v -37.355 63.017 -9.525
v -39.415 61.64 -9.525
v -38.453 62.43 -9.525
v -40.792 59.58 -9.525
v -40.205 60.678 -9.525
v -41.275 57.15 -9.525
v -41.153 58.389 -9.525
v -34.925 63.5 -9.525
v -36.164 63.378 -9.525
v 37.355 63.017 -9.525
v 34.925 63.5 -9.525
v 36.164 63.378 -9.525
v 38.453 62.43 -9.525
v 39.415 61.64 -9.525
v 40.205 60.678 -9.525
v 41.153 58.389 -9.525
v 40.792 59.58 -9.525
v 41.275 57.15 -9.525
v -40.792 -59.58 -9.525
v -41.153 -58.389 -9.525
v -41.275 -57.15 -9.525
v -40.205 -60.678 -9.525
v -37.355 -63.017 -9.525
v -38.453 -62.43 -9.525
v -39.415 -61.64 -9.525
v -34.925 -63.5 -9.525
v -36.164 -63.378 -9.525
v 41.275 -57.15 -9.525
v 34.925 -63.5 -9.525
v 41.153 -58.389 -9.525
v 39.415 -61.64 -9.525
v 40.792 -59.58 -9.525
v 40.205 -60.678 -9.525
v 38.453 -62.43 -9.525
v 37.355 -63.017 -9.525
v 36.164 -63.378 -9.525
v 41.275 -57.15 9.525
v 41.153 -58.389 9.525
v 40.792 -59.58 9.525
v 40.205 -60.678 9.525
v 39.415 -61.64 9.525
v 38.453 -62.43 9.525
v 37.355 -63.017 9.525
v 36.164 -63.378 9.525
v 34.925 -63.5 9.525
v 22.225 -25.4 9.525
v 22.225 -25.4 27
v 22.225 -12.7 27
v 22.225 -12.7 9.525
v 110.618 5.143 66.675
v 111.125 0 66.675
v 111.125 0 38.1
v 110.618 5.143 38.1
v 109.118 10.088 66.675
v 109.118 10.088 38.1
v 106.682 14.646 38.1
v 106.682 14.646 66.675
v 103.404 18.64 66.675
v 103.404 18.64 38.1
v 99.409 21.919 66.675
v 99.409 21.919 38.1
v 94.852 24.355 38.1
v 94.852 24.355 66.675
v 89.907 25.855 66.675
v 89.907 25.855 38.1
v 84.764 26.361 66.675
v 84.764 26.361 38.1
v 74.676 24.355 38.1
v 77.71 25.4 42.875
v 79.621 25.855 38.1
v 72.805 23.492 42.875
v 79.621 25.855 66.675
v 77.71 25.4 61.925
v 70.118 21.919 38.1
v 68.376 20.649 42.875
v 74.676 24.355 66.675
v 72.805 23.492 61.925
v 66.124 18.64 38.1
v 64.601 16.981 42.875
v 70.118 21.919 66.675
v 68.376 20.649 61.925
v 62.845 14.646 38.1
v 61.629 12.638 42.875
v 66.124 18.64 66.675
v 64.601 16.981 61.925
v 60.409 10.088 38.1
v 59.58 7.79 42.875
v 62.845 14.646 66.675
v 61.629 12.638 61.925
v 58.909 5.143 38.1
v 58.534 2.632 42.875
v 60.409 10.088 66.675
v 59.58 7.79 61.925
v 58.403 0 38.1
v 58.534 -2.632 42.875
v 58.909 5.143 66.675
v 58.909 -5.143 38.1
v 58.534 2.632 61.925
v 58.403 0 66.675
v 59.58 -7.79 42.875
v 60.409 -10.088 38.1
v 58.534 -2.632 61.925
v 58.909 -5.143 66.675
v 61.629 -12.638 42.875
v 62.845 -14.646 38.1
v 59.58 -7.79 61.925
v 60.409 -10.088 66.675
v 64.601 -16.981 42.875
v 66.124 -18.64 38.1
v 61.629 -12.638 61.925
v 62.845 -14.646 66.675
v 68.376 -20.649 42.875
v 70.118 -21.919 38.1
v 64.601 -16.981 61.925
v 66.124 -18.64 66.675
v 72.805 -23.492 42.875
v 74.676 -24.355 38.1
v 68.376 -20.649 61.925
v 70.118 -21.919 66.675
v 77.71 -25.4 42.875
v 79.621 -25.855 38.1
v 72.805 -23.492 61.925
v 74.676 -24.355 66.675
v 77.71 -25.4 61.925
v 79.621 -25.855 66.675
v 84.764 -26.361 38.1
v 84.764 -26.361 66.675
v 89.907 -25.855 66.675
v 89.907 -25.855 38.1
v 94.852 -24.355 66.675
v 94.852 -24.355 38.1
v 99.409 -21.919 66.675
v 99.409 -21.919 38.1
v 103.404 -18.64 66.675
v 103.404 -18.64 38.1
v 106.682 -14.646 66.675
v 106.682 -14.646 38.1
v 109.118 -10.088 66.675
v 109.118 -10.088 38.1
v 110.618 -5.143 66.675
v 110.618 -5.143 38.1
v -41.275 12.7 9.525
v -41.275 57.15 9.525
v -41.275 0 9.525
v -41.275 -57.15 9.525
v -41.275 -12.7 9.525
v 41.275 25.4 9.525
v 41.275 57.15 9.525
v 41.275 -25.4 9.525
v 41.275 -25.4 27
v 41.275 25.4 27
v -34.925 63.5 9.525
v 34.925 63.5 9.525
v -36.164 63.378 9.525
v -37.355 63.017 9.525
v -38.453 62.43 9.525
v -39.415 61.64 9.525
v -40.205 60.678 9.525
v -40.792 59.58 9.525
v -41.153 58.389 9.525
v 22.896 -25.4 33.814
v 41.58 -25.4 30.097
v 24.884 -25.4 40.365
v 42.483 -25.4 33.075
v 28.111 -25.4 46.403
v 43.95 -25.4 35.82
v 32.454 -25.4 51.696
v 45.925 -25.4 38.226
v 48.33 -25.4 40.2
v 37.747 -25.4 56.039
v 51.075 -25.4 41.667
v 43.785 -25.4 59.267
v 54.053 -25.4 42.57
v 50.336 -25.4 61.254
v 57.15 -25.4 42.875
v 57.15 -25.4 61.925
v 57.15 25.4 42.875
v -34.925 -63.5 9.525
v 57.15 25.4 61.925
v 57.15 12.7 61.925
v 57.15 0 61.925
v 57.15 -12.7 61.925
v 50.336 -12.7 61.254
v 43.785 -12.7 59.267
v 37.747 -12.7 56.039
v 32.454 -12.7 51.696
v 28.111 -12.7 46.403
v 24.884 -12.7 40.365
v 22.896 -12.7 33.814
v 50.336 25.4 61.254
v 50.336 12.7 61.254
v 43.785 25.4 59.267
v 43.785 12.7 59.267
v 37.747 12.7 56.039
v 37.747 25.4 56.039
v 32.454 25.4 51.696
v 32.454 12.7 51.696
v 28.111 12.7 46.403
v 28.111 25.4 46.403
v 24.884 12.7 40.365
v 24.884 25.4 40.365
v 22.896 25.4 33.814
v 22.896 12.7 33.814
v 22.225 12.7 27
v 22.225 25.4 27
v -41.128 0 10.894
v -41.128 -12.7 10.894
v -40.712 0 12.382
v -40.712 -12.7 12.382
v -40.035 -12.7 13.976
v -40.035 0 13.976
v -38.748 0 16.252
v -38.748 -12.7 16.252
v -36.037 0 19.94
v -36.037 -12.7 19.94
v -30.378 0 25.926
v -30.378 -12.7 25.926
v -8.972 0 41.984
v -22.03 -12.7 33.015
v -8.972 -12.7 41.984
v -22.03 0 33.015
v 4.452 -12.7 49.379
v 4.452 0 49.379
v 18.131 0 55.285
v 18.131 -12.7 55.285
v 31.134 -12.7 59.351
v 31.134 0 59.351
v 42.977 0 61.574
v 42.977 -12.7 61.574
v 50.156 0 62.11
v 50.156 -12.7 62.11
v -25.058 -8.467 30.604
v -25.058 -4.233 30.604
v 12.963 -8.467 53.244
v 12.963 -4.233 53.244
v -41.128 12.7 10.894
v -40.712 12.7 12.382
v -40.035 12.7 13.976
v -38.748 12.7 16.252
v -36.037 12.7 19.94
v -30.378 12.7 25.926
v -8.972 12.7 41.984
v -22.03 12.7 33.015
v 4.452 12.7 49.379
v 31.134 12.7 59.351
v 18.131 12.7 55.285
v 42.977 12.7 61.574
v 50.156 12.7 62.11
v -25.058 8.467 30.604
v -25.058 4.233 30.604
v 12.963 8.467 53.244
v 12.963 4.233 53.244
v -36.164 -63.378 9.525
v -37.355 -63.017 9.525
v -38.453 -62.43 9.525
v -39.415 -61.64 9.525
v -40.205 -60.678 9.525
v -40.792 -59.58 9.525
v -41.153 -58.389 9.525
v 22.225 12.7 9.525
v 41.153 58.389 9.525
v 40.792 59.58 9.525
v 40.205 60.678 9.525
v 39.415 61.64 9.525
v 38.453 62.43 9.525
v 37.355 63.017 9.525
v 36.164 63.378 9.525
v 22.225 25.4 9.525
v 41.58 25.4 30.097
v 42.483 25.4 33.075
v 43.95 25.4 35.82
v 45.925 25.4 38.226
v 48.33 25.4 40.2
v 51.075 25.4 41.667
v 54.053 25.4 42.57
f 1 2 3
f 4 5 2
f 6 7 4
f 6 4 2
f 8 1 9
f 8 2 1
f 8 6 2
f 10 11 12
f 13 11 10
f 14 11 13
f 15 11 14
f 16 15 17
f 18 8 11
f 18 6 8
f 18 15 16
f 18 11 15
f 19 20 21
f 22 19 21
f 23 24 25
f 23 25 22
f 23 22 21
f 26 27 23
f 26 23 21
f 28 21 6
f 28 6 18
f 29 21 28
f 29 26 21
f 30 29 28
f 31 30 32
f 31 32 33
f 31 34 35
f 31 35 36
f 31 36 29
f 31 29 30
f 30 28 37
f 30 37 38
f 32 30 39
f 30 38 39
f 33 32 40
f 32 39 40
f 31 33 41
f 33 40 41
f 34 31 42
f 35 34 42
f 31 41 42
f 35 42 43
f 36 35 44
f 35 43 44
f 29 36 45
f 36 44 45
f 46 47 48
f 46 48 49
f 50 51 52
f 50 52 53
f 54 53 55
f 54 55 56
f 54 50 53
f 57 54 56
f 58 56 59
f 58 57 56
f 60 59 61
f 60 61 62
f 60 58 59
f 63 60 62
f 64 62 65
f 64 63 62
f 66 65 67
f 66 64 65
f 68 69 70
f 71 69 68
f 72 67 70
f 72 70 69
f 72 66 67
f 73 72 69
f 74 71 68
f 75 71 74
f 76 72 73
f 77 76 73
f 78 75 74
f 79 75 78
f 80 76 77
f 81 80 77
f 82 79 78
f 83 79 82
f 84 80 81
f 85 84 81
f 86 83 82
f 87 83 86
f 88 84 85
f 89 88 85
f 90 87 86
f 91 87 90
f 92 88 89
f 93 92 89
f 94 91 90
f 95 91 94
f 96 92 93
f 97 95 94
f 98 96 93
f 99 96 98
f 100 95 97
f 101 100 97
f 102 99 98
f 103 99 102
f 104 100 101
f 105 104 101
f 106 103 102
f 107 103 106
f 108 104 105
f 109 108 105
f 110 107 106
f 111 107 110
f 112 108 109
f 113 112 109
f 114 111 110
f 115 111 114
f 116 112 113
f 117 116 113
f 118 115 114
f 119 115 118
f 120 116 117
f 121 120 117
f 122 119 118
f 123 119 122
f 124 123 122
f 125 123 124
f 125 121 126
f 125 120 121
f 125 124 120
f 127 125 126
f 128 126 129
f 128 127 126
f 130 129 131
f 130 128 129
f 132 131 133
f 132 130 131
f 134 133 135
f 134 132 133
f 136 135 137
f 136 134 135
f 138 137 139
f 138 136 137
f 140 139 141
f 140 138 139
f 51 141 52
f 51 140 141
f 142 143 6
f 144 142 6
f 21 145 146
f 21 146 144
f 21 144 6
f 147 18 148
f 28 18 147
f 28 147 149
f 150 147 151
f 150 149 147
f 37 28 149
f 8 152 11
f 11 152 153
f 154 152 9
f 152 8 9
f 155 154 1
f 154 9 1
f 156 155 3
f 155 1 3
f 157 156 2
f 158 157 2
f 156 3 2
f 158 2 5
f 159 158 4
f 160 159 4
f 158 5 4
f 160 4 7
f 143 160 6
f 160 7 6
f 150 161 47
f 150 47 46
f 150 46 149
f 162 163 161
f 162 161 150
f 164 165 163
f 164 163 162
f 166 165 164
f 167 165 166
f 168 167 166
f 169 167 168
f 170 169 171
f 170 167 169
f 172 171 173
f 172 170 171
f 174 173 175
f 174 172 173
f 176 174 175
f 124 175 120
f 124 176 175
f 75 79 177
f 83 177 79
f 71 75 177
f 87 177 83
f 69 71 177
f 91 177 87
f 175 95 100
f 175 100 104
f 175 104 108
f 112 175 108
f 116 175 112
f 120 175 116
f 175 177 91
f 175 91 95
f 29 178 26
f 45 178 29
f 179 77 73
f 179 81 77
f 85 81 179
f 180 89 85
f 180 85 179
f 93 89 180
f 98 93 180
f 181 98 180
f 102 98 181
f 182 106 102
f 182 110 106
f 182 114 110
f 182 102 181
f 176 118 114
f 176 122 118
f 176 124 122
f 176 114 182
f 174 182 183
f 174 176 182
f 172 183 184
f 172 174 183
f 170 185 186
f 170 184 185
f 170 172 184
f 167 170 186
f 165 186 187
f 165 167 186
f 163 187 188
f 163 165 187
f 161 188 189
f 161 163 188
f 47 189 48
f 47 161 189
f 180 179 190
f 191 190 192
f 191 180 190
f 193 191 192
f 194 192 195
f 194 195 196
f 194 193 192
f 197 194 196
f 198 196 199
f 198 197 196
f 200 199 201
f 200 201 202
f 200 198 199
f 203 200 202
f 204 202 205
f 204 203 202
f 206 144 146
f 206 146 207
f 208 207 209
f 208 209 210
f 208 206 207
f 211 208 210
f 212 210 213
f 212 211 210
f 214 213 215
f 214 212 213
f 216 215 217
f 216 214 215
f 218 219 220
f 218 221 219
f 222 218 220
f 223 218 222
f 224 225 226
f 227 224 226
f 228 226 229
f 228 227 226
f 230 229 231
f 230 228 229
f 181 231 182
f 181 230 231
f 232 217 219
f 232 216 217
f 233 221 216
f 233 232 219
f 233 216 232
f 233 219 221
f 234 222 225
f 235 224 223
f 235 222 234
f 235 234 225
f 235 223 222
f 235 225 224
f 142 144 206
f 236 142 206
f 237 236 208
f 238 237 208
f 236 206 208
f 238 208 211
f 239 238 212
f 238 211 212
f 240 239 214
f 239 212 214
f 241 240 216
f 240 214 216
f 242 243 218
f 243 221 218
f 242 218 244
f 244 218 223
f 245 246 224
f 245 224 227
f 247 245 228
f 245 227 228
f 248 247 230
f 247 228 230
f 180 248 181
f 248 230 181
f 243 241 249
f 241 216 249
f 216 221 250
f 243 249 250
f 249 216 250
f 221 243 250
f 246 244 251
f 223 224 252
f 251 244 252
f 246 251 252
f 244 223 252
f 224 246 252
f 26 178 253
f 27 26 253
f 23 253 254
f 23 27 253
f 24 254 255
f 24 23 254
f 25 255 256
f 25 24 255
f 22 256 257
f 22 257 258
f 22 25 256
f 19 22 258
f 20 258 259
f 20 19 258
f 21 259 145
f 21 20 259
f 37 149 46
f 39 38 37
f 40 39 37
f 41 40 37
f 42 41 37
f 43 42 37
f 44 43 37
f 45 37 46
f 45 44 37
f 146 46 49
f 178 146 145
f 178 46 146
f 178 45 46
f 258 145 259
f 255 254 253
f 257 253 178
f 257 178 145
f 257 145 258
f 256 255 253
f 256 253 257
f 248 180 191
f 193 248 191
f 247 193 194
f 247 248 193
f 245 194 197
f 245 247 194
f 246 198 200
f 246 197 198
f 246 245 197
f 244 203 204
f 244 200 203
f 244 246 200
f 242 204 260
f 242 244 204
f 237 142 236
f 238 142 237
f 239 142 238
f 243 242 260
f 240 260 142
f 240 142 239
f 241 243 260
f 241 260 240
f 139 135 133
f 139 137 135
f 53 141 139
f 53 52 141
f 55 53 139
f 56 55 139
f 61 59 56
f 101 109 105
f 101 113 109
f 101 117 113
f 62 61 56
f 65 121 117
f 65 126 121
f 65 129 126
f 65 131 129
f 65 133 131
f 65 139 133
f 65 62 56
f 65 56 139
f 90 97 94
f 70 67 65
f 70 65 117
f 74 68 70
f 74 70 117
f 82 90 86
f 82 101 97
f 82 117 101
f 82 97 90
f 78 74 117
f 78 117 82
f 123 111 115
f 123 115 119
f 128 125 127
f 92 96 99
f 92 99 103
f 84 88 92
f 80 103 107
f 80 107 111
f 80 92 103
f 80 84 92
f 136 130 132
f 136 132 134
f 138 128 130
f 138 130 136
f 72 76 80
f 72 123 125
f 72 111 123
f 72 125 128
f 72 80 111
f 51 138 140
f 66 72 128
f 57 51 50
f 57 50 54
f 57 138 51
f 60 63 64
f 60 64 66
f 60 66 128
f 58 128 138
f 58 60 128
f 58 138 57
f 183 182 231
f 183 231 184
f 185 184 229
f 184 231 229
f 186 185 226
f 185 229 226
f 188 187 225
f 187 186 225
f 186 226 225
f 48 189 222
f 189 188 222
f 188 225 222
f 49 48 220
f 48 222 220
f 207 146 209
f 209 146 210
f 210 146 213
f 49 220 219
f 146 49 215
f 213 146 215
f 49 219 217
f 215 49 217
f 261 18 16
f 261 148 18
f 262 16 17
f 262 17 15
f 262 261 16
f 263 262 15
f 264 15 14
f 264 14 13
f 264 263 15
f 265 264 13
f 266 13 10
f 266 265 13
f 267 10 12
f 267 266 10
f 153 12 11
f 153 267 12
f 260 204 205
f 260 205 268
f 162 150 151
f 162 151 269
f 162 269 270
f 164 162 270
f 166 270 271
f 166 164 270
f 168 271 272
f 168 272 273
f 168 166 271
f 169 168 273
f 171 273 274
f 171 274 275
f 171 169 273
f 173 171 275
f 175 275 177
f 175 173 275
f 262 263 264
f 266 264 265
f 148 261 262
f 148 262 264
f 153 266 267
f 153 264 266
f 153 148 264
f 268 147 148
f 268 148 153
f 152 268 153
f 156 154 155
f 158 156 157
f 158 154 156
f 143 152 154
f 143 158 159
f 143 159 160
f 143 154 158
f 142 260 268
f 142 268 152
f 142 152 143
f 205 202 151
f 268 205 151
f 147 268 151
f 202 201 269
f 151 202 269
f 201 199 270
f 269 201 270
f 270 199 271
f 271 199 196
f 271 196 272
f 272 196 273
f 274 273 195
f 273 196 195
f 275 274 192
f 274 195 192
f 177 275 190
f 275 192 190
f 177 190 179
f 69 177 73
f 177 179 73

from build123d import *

# Parameters (mm, degrees)
F1_DEPTH = 63.5
F0_W     = 24.4387735501
F0_H     = 19.05
F2_DEPTH = 25.4
F3_DEPTH = 12.7
F4_DEPTH = 25.4
F6_R     = 6.35


with BuildPart() as f1:
    # F0 (on Front) → F1 (new body, symmetric)
    with BuildSketch(Plane.XZ):
        Polygon((-41.275, 9.525), (-41.275, -9.525), (41.275, -9.525), (41.275, 9.525), (22.225, 9.525), align=None)
    extrude(amount=F1_DEPTH, both=True)

    # F0 (on Front) → F2 (join, symmetric)
    with BuildSketch(Plane.XZ):
        with BuildLine():
            Line((22.225, 9.525), (41.275, 9.525))
            Line((41.275, 9.525), (41.275, 27.0002))
            ThreePointArc((41.275, 27.0002), (45.9246798487, 38.2255201513), (57.15, 42.8752))
            Line((57.15, 42.8752), (60.325, 42.8752))
            Line((60.325, 42.8752), (60.325, 61.9252))
            Line((60.325, 61.9252), (57.15, 61.9252))
            ThreePointArc((57.15, 61.9252), (32.4542956671, 51.6959043329), (22.225, 27.0002))
            Line((22.225, 27.0002), (22.225, 9.525))
        make_face()
        with Locations((72.5443867751, 52.4002)):
            Rectangle(F0_W, F0_H)
    extrude(amount=F2_DEPTH, both=True)

    # F0 (on Front) → F3 (join, symmetric)
    with BuildSketch(Plane.XZ):
        with BuildLine():
            add(Edge.make_bspline(
                [(-41.275, 9.525), (-41.1736518145, 24.6508456767), (15.0934131816, 65.3959661722), (57.15, 61.9252)],
                knots=[0, 0, 0, 0, 111.5045361635, 111.5045361635, 111.5045361635, 111.5045361635], degree=3))
            Line((-41.275, 9.525), (22.225, 9.525))
            Line((22.225, 9.525), (22.225, 27.0002))
            ThreePointArc((22.225, 27.0002), (32.4542956671, 51.6959043329), (57.15, 61.9252))
        make_face()
    extrude(amount=F3_DEPTH, both=True)

    # F0 (on Front) → F4 (join, symmetric)
    with BuildSketch(Plane.XZ):
        with Locations((72.5443867751, 52.4002)):
            Rectangle(F0_W, F0_H)
    extrude(amount=F4_DEPTH, both=True)

    # F0 (on Front) → F5 (revolve)
    with BuildSketch(Plane.XZ):
        Polygon((84.7637735501, 66.675), (84.7637735501, 61.9252), (84.7637735501, 42.8752), (84.7637735501, 38.1), (111.125, 38.1), (111.125, 66.675), align=None)
    revolve(axis=Axis((84.7637735501, 0, 52.3875), (0, 0, 1)))

    # F6
    f6_edges = [f1.edges().sort_by_distance(p)[0] for p in [
        (-41.275, -63.5, 0),
        (41.275, -63.5, 0),
        (41.275, 63.5, 0),
        (-41.275, 63.5, 0),
    ]]
    fillet(f6_edges, radius=F6_R)


solid = f1.part
